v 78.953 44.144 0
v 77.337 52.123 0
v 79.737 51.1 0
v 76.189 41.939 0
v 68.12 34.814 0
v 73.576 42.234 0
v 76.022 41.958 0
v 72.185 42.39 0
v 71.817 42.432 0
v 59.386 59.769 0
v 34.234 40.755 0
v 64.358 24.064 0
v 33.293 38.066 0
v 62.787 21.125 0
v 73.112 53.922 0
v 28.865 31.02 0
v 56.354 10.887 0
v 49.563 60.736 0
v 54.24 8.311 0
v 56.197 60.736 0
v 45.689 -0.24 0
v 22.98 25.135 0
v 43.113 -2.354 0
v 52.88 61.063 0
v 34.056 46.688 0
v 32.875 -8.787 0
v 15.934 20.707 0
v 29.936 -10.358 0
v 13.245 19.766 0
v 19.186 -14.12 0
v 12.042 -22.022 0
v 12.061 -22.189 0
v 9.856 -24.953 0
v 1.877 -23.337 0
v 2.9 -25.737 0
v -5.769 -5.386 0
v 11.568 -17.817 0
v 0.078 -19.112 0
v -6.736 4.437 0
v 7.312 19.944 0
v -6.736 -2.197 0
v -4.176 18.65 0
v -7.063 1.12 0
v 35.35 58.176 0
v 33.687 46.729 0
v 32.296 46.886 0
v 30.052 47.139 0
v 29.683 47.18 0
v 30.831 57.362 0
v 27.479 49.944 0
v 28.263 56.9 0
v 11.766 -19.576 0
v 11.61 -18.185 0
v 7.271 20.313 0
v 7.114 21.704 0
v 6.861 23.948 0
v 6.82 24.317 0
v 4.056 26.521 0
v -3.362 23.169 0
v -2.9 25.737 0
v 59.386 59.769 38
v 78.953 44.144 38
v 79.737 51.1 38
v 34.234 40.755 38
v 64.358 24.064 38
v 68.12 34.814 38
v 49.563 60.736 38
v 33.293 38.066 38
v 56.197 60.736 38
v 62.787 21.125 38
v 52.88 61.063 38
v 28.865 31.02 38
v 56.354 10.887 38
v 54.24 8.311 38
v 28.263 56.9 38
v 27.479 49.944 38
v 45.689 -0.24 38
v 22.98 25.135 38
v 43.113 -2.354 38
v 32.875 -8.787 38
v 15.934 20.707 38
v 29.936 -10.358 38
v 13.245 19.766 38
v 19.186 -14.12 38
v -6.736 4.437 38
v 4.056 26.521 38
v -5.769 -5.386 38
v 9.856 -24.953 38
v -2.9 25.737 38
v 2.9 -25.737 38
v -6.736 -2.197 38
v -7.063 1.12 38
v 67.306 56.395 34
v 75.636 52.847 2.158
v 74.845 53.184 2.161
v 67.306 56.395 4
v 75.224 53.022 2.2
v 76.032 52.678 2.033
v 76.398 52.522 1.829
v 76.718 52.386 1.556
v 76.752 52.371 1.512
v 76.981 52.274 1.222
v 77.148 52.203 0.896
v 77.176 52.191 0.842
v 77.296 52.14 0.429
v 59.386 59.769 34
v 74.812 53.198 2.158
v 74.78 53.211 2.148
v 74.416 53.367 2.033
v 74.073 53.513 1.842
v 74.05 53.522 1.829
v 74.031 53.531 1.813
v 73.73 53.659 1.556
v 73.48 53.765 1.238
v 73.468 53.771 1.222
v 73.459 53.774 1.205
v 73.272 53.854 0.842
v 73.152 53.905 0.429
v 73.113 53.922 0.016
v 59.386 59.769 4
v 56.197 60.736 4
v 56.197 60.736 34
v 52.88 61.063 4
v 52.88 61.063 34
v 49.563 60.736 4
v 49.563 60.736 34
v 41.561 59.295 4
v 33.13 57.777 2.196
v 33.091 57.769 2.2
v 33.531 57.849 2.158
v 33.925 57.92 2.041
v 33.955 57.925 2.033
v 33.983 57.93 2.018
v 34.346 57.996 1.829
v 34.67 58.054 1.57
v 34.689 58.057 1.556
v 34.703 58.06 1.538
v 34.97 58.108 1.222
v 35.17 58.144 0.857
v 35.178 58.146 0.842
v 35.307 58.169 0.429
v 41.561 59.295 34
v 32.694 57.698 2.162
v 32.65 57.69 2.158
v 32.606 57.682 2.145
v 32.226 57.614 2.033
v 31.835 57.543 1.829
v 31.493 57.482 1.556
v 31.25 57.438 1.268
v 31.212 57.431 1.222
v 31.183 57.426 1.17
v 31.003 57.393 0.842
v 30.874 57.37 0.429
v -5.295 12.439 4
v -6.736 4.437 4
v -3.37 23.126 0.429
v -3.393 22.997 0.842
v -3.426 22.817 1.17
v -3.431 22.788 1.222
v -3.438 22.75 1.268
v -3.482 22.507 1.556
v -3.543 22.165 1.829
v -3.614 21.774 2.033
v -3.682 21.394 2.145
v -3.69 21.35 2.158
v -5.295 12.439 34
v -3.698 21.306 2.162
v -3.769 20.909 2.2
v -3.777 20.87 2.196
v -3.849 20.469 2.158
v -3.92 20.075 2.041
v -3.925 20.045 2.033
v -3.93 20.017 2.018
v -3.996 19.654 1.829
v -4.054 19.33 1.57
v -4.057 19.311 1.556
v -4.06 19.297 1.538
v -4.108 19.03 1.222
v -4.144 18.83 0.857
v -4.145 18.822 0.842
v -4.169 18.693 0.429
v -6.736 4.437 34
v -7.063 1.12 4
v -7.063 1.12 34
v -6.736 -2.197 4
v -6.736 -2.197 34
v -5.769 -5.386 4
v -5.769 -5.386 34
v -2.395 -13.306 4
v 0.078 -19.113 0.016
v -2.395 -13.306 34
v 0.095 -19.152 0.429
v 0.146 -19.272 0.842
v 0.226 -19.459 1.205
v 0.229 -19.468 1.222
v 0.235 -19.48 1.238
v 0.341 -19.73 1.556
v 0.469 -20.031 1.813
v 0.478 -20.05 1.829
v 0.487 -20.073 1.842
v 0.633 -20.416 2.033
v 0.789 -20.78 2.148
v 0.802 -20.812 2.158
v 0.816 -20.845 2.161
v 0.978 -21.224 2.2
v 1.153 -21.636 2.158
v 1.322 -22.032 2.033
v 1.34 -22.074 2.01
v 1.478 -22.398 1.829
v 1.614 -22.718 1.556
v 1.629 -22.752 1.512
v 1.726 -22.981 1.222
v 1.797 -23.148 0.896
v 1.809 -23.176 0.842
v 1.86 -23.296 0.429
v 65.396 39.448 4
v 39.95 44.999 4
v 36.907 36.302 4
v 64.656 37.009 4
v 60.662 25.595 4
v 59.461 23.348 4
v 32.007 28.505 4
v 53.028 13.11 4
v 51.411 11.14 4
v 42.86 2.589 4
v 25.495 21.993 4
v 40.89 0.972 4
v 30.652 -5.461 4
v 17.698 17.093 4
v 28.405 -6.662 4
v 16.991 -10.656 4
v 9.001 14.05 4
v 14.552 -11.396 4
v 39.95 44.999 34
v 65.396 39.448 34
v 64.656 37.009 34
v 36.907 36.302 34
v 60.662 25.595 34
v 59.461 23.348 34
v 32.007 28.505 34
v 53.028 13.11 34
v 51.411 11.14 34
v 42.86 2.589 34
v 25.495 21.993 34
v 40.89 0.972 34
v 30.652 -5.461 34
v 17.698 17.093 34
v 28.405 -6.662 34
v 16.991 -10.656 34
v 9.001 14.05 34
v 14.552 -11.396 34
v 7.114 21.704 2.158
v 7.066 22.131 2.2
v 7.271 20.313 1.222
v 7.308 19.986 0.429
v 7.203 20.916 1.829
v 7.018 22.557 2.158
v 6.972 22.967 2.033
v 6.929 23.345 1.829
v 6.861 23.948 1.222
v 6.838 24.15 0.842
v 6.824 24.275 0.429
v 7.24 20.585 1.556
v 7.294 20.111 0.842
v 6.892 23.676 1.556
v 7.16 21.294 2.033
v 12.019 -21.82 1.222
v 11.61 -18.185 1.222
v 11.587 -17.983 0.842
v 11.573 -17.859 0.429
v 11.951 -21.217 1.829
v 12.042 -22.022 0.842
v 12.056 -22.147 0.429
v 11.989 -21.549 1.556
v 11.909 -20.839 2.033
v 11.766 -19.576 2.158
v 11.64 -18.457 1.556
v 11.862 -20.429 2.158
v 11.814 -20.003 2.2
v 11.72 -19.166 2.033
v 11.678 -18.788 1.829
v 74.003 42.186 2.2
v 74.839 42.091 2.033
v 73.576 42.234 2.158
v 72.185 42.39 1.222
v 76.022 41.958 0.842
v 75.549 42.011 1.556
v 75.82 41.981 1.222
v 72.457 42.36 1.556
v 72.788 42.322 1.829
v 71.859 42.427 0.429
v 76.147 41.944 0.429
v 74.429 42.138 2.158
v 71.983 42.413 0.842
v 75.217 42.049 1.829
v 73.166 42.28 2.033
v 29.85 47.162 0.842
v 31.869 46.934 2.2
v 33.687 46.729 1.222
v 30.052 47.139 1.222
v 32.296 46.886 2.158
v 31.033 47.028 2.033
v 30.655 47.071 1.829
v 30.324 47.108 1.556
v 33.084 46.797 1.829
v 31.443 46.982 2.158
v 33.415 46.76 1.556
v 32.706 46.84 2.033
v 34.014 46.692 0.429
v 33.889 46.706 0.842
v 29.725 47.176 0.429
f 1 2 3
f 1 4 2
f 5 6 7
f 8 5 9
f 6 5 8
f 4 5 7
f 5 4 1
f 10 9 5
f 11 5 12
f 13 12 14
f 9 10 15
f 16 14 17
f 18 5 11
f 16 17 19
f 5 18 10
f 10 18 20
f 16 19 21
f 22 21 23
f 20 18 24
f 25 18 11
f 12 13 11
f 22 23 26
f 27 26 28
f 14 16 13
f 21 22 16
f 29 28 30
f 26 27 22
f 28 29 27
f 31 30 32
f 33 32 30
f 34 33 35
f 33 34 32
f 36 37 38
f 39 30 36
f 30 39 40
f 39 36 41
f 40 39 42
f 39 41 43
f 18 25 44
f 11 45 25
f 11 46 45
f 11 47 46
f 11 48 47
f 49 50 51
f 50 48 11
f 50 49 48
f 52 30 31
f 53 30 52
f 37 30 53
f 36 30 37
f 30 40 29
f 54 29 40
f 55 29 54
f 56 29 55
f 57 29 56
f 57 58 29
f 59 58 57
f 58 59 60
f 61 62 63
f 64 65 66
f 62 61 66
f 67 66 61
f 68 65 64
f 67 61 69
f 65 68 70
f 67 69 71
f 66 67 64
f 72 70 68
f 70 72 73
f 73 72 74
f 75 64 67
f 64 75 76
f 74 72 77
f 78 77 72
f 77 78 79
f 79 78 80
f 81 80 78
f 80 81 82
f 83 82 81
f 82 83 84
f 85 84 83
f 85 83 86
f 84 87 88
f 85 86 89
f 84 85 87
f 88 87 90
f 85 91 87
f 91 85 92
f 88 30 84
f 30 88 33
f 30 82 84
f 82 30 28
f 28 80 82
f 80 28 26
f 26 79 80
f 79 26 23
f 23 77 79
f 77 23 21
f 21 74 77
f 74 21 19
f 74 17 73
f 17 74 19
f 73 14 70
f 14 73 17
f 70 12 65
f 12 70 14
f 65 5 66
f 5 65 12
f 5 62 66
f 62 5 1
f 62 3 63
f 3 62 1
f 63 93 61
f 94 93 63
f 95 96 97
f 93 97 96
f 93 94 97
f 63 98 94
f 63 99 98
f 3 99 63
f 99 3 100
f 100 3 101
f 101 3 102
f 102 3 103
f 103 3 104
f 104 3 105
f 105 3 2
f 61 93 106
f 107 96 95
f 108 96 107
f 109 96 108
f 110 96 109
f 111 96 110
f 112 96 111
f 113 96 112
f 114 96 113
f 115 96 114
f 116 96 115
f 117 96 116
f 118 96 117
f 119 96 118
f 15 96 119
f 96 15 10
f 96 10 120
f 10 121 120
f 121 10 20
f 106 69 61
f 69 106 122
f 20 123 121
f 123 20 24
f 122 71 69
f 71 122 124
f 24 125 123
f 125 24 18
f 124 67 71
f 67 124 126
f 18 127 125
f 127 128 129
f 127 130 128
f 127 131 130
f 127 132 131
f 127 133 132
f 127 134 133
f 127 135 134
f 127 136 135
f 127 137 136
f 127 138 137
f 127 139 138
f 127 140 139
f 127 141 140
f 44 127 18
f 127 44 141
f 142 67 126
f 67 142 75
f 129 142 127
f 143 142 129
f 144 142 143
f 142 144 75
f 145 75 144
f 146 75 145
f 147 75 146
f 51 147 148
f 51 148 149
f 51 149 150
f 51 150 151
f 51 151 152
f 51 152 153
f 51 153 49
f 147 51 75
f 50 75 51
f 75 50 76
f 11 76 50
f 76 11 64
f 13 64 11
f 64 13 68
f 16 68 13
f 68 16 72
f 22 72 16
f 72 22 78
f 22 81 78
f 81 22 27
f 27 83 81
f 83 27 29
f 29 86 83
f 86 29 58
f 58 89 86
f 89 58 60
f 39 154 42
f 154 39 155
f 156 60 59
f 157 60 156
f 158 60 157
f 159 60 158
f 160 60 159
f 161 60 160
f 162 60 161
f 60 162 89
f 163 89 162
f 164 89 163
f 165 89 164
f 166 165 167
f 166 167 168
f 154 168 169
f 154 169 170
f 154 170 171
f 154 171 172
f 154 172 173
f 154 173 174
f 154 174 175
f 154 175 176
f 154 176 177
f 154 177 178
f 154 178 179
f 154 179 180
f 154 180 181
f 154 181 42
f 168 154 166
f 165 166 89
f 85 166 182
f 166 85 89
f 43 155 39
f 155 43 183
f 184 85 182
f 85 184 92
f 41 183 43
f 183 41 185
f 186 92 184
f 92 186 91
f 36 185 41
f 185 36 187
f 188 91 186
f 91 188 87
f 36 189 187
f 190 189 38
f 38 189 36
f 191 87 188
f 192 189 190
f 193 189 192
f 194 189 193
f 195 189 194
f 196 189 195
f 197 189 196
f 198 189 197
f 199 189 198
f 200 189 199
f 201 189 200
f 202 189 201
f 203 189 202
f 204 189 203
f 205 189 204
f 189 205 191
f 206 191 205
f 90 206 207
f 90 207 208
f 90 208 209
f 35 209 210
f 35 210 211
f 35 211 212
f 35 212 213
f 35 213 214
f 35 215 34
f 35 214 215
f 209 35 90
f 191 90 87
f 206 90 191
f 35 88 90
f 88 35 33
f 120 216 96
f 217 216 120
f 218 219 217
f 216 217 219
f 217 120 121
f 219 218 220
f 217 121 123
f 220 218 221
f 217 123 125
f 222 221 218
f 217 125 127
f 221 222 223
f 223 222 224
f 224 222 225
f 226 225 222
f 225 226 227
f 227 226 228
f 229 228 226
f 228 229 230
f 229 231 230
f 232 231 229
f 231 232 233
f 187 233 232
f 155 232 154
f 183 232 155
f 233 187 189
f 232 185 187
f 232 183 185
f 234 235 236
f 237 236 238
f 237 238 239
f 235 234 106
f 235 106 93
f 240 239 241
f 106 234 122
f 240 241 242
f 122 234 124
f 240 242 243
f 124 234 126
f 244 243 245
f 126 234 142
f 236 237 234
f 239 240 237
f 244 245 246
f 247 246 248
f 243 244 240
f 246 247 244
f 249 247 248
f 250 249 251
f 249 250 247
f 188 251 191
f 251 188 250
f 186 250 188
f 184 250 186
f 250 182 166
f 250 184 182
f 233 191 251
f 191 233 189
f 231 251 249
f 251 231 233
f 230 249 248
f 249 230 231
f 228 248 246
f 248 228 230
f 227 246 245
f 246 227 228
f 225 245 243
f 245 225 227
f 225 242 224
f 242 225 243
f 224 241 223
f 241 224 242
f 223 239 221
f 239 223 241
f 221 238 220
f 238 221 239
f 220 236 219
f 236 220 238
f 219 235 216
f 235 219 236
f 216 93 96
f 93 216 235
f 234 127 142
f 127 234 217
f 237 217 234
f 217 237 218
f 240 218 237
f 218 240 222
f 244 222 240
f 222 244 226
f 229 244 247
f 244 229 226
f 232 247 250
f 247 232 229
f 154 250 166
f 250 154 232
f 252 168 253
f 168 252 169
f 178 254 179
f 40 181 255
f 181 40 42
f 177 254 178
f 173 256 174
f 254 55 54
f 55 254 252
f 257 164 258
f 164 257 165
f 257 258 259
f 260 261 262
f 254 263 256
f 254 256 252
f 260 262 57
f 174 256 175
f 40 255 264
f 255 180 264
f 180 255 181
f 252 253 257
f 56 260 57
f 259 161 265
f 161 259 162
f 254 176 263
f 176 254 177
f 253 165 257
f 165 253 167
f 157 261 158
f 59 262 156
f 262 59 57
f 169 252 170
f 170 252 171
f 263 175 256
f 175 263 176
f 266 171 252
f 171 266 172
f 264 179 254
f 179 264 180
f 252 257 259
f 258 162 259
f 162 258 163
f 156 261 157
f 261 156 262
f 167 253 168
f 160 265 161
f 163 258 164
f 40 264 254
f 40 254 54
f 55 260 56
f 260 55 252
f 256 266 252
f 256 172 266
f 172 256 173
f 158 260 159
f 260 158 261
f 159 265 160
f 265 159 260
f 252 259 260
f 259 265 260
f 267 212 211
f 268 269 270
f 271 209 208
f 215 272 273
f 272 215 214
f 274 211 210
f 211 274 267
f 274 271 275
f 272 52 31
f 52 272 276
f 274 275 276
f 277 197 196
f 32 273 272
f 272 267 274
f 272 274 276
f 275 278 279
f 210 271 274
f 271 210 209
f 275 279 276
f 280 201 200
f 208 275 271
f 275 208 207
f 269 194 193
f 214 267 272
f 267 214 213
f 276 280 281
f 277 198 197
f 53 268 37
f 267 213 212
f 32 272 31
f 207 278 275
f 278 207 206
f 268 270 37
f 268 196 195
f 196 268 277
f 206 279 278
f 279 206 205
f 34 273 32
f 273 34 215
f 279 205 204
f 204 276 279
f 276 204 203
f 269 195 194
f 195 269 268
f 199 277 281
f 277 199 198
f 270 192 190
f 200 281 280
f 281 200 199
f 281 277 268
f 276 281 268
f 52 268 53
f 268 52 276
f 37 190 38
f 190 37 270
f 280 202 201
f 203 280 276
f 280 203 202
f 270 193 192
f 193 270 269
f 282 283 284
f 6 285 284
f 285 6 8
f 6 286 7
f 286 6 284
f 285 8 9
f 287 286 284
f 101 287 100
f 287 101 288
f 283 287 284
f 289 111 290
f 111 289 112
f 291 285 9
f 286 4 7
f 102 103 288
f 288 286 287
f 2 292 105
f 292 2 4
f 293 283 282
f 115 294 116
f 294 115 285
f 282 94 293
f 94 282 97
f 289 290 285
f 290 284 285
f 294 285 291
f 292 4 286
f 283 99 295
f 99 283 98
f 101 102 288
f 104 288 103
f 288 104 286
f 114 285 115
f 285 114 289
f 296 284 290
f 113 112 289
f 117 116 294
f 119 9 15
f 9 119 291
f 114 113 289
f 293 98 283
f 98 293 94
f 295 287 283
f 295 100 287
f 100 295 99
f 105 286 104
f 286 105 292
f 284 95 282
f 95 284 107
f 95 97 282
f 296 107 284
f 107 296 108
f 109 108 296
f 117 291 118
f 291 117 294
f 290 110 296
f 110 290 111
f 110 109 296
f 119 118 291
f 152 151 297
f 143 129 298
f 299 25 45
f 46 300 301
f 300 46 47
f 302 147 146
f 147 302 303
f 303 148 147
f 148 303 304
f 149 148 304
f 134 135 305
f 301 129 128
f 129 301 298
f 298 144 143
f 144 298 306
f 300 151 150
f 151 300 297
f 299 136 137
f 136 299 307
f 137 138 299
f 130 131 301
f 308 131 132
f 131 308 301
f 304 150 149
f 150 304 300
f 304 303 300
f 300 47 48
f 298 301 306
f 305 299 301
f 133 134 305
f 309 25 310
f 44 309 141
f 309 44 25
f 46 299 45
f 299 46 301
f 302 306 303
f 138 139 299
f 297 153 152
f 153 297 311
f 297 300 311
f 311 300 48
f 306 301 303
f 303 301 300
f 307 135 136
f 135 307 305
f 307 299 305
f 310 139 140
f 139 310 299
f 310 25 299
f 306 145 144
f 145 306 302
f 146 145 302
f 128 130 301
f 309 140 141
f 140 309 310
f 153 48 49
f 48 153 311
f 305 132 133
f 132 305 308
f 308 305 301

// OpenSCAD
$fn = 32;

// ----------------------------------------------------------------------
// Air duct: 34 mm duct, 4 mm wall, 38 mm across
// ----------------------------------------------------------------------

// --- parameters (mm) ---
duct_r = 17;              // duct core radius
duct_d = 34;              // duct core diameter
wall = 4;                 // duct wall thickness
height = 38;              // duct width (extrusion height)
port_r = 25.9;            // port flange half width
port_d = 51.8;            // port flange width
port_t = 7;               // port flange thickness
bolt_d = 4.4;             // port bolt holes
bolt_offset = 21.2;       // bolt hole offset from the port axis

difference() {
  /* outer hull chain: tube with a flat flange plate at every port */
  linear_extrude(height = 38) {
    hull() {
      polygon([[2.9, -25.737], [-2.9, 25.737], [4.056, 26.521], [9.856, -24.953]]);
      translate([9.937, 1.12]) circle(r = 17);
    }
    hull() {
      translate([9.937, 1.12]) circle(r = 17);
      translate([12.016, 1.354]) circle(r = 17);
    }
    hull() {
      translate([12.016, 1.354]) circle(r = 17);
      translate([23.43, 5.348]) circle(r = 17);
    }
    hull() {
      translate([23.43, 5.348]) circle(r = 17);
      translate([33.668, 11.781]) circle(r = 17);
    }
    hull() {
      translate([33.668, 11.781]) circle(r = 17);
      translate([42.219, 20.332]) circle(r = 17);
    }
    hull() {
      translate([42.219, 20.332]) circle(r = 17);
      translate([48.652, 30.57]) circle(r = 17);
    }
    hull() {
      translate([48.652, 30.57]) circle(r = 17);
      translate([52.646, 41.984]) circle(r = 17);
    }
    hull() {
      translate([52.646, 41.984]) circle(r = 17);
      translate([52.88, 44.063]) circle(r = 17);
    }
    hull() {
      translate([52.88, 44.063]) circle(r = 17);
      polygon([[28.263, 56.9], [79.737, 51.1], [78.953, 44.144], [27.479, 49.944]]);
    }
  }
  /* air passage: the same chain inset by the wall, 5 mm proud of the ports */
  translate([0, 0, 4]) linear_extrude(height = 30) {
    hull() {
      translate([-4.969, -0.56]) circle(r = 13);
      translate([12.016, 1.354]) circle(r = 13);
    }
    hull() {
      translate([12.016, 1.354]) circle(r = 13);
      translate([23.43, 5.348]) circle(r = 13);
    }
    hull() {
      translate([23.43, 5.348]) circle(r = 13);
      translate([33.668, 11.781]) circle(r = 13);
    }
    hull() {
      translate([33.668, 11.781]) circle(r = 13);
      translate([42.219, 20.332]) circle(r = 13);
    }
    hull() {
      translate([42.219, 20.332]) circle(r = 13);
      translate([48.652, 30.57]) circle(r = 13);
    }
    hull() {
      translate([48.652, 30.57]) circle(r = 13);
      translate([52.646, 41.984]) circle(r = 13);
    }
    hull() {
      translate([52.646, 41.984]) circle(r = 13);
      translate([54.56, 58.969]) circle(r = 13);
    }
  }
  translate([0, 0]) rotate([0, 0, -83.57]) translate([-21.2, -2.5]) rotate([-90, 0, 0]) cylinder(h = 12, d = 4.4);
  translate([0, 0]) rotate([0, 0, -83.57]) translate([21.2, -2.5]) rotate([-90, 0, 0]) cylinder(h = 12, d = 4.4);
  translate([54, 54]) rotate([0, 0, 173.57]) translate([-21.2, -2.5]) rotate([-90, 0, 0]) cylinder(h = 12, d = 4.4);
  translate([54, 54]) rotate([0, 0, 173.57]) translate([21.2, -2.5]) rotate([-90, 0, 0]) cylinder(h = 12, d = 4.4);
}
